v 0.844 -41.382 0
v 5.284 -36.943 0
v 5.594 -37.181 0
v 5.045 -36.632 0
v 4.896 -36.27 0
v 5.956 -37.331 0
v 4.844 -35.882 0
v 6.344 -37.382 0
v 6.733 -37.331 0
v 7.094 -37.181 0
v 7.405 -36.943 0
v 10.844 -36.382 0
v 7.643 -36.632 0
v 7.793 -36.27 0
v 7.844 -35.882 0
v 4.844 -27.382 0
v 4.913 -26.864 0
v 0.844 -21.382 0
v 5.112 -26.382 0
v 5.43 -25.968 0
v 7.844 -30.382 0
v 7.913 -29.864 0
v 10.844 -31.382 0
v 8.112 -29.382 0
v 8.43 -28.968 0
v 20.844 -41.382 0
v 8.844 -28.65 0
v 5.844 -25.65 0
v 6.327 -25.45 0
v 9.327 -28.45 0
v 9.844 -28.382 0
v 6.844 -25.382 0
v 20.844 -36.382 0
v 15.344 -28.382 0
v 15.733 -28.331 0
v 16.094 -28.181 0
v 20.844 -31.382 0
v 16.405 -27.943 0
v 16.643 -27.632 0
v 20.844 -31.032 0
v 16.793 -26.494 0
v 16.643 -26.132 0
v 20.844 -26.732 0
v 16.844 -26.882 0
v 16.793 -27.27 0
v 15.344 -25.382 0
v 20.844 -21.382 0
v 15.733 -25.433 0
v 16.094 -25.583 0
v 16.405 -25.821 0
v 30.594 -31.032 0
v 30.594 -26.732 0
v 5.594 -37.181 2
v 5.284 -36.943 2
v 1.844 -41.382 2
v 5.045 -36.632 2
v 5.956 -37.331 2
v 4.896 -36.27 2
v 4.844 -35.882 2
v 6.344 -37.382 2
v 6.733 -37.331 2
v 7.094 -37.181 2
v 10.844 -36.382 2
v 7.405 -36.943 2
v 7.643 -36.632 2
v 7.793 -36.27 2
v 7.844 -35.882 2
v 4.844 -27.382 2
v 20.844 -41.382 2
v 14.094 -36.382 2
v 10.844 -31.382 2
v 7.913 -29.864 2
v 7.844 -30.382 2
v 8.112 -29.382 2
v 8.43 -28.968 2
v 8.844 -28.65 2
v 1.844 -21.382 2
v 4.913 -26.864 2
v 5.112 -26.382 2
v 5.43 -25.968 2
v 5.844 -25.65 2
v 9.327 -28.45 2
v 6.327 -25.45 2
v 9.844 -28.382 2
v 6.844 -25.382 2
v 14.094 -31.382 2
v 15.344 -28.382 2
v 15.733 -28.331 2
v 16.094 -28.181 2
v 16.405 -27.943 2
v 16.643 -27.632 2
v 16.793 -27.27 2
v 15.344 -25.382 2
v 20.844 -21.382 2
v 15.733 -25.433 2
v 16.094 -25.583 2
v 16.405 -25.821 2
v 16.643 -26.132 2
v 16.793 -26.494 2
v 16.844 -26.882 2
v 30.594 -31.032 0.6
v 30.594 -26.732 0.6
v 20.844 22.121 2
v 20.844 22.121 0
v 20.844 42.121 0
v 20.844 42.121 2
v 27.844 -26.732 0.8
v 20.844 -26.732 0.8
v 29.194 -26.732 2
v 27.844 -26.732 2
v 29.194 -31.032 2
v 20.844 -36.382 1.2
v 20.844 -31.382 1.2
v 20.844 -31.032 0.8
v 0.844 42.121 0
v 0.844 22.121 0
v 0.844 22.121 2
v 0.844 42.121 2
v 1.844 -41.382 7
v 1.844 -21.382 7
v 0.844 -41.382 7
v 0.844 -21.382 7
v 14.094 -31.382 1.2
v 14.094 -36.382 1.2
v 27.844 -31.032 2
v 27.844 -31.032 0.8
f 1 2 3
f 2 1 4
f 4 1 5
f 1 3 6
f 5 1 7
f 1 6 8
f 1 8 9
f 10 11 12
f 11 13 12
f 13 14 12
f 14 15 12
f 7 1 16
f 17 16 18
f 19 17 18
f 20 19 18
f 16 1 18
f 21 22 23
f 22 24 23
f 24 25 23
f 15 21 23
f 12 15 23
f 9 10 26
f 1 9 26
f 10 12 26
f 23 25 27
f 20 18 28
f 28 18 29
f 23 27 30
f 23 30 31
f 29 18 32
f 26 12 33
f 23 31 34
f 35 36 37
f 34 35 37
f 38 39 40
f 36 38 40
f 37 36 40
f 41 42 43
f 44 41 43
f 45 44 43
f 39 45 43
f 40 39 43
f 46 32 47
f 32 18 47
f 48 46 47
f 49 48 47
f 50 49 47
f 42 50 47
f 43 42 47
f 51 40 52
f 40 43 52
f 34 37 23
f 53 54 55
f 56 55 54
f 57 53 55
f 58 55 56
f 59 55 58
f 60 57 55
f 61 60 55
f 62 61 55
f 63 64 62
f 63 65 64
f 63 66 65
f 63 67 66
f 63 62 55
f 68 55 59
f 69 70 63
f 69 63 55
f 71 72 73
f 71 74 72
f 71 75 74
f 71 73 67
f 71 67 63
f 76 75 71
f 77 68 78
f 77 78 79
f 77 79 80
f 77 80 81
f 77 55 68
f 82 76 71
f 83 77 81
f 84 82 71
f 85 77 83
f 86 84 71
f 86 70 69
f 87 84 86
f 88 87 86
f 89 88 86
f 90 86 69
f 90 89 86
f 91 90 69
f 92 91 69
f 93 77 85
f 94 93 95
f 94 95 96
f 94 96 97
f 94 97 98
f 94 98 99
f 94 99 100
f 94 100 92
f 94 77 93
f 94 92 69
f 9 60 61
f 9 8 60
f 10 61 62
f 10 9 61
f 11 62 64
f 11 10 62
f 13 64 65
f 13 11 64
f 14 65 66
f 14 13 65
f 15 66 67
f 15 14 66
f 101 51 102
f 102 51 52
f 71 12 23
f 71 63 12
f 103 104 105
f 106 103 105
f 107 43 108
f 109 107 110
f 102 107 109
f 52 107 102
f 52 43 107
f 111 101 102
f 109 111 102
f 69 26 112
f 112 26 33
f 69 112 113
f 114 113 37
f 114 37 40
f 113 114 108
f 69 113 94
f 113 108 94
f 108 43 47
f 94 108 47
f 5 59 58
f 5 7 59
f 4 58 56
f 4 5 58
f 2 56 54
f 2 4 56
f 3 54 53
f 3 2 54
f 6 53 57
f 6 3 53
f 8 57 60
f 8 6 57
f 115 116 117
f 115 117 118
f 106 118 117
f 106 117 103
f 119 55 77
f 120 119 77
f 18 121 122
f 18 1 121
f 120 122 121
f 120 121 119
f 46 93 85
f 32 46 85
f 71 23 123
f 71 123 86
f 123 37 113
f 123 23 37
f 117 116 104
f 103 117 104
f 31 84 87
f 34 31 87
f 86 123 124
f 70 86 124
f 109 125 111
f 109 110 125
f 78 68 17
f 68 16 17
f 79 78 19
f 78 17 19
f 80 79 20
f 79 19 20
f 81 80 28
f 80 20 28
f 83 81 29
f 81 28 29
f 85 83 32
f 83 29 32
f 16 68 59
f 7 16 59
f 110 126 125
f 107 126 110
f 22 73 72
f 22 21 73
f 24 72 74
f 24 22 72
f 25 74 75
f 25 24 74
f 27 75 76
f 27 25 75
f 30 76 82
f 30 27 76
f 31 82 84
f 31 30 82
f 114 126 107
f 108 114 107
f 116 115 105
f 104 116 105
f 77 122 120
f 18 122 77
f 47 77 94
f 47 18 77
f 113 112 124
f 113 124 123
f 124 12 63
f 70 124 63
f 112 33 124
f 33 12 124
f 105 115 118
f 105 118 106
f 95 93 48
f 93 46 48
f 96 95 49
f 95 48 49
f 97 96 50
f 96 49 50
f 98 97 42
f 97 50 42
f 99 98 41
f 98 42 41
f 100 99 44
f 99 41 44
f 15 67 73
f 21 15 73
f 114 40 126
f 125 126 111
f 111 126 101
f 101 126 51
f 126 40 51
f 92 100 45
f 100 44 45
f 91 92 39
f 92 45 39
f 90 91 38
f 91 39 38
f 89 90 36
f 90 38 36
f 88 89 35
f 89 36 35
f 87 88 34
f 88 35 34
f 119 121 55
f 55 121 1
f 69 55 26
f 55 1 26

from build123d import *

# Parameters (mm, degrees)
F0_W      = 20
F0_H      = 20
F1_DEPTH  = 2
F2_W      = 5
F2_H      = 1.2
F3_DEPTH  = 10
F4_W      = 3.25
F4_H      = 5
F5_DEPTH  = 0.801
F6_W      = 4.3
F6_H      = 0.8
F7_DEPTH  = 9.75
F8_W      = 2.75
F8_H      = 4.3
F9_DEPTH  = 1.2
F10_SIZE  = 1.4
F11_W     = 1
F11_H     = 20
F12_DEPTH = 5
F14_DEPTH = 2.001
F15_R     = 2
F16_R     = 1.49999


# Not quite as in the source:
# - a fillet or chamfer is up to 0.001 mm smaller than in the source, because OpenCascade refuses the exact size


with BuildPart() as f1:
    # F0 (on Top) → F1 (new body)
    with BuildSketch(Plane.XY):
        with Locations((10.8443908393, -31.3820495651)):
            Rectangle(F0_W, F0_H)
    extrude(amount=F1_DEPTH)

    # F2 (on face) → F3 (cut)
    with BuildSketch(Plane.YZ.offset(20.8443908393)):
        with Locations((-33.8820495651, 0.6)):
            Rectangle(F2_W, F2_H)
    extrude(amount=-F3_DEPTH, mode=Mode.SUBTRACT)

    # F4 (on face) → F5 (cut, through all)
    with BuildSketch(Plane(origin=(0, 0, 1.2), x_dir=(1, 0, 0), z_dir=(0, 0, -1))):
        with Locations((12.4693908393, 33.8820495651)):
            Rectangle(F4_W, F4_H)
    extrude(amount=-F5_DEPTH, mode=Mode.SUBTRACT)

    # F6 (on face) → F7 (join)
    with BuildSketch(Plane.YZ.offset(20.8443908393)):
        with Locations((-28.8820495651, 0.4)):
            Rectangle(F6_W, F6_H)
    extrude(amount=F7_DEPTH)

    # F8 (on face) → F9 (join)
    with BuildSketch(Plane.XY.offset(0.8)):
        with Locations((29.2193908393, -28.8820495651)):
            Rectangle(F8_W, F8_H)
    extrude(amount=F9_DEPTH)

    # F10
    f10_edges = [f1.edges().sort_by_distance(p)[0] for p in [
        (30.594391, -28.88205, 2),
    ]]
    chamfer(f10_edges, length=F10_SIZE)

    # F11 (on face) → F12 (join)
    with BuildSketch(Plane.XY.offset(2)):
        with Locations((1.3443908393, -31.3820495651)):
            Rectangle(F11_W, F11_H)
    extrude(amount=F12_DEPTH)

    # F13 (on face) → F14 (cut, through all)
    with BuildSketch(Plane.XY.offset(2)):
        Polygon((4.8443908393, -25.3820495651), (4.8443908393, -37.3820495651), (7.8443908393, -37.3820495651), (7.8443908393, -28.3820495651), (16.8443908393, -28.3820495651), (16.8443908393, -25.3820495651), align=None)
    extrude(amount=-F14_DEPTH, mode=Mode.SUBTRACT)

    # F15
    f15_edges = [f1.edges().sort_by_distance(p)[0] for p in [
        (7.844391, -28.38205, 1),
        (4.844391, -25.38205, 1),
    ]]
    fillet(f15_edges, radius=F15_R)

    # F16 (radius 1.5 in the source; OpenCascade refuses exactly that, so slightly less here)
    f16_edges = [f1.edges().sort_by_distance(p)[0] for p in [
        (4.844391, -37.38205, 1),
        (7.844391, -37.38205, 1),
        (16.844391, -28.38205, 1),
        (16.844391, -25.38205, 1),
    ]]
    fillet(f16_edges, radius=F16_R)


with BuildPart() as f1b:
    # F0 (on Top) → F1, piece 2 (new body)
    with BuildSketch(Plane.XY):
        with Locations((10.8443908393, 32.1213992728)):
            Rectangle(F0_W, F0_H)
    extrude(amount=F1_DEPTH)


solid = Compound([f1.part, f1b.part])
